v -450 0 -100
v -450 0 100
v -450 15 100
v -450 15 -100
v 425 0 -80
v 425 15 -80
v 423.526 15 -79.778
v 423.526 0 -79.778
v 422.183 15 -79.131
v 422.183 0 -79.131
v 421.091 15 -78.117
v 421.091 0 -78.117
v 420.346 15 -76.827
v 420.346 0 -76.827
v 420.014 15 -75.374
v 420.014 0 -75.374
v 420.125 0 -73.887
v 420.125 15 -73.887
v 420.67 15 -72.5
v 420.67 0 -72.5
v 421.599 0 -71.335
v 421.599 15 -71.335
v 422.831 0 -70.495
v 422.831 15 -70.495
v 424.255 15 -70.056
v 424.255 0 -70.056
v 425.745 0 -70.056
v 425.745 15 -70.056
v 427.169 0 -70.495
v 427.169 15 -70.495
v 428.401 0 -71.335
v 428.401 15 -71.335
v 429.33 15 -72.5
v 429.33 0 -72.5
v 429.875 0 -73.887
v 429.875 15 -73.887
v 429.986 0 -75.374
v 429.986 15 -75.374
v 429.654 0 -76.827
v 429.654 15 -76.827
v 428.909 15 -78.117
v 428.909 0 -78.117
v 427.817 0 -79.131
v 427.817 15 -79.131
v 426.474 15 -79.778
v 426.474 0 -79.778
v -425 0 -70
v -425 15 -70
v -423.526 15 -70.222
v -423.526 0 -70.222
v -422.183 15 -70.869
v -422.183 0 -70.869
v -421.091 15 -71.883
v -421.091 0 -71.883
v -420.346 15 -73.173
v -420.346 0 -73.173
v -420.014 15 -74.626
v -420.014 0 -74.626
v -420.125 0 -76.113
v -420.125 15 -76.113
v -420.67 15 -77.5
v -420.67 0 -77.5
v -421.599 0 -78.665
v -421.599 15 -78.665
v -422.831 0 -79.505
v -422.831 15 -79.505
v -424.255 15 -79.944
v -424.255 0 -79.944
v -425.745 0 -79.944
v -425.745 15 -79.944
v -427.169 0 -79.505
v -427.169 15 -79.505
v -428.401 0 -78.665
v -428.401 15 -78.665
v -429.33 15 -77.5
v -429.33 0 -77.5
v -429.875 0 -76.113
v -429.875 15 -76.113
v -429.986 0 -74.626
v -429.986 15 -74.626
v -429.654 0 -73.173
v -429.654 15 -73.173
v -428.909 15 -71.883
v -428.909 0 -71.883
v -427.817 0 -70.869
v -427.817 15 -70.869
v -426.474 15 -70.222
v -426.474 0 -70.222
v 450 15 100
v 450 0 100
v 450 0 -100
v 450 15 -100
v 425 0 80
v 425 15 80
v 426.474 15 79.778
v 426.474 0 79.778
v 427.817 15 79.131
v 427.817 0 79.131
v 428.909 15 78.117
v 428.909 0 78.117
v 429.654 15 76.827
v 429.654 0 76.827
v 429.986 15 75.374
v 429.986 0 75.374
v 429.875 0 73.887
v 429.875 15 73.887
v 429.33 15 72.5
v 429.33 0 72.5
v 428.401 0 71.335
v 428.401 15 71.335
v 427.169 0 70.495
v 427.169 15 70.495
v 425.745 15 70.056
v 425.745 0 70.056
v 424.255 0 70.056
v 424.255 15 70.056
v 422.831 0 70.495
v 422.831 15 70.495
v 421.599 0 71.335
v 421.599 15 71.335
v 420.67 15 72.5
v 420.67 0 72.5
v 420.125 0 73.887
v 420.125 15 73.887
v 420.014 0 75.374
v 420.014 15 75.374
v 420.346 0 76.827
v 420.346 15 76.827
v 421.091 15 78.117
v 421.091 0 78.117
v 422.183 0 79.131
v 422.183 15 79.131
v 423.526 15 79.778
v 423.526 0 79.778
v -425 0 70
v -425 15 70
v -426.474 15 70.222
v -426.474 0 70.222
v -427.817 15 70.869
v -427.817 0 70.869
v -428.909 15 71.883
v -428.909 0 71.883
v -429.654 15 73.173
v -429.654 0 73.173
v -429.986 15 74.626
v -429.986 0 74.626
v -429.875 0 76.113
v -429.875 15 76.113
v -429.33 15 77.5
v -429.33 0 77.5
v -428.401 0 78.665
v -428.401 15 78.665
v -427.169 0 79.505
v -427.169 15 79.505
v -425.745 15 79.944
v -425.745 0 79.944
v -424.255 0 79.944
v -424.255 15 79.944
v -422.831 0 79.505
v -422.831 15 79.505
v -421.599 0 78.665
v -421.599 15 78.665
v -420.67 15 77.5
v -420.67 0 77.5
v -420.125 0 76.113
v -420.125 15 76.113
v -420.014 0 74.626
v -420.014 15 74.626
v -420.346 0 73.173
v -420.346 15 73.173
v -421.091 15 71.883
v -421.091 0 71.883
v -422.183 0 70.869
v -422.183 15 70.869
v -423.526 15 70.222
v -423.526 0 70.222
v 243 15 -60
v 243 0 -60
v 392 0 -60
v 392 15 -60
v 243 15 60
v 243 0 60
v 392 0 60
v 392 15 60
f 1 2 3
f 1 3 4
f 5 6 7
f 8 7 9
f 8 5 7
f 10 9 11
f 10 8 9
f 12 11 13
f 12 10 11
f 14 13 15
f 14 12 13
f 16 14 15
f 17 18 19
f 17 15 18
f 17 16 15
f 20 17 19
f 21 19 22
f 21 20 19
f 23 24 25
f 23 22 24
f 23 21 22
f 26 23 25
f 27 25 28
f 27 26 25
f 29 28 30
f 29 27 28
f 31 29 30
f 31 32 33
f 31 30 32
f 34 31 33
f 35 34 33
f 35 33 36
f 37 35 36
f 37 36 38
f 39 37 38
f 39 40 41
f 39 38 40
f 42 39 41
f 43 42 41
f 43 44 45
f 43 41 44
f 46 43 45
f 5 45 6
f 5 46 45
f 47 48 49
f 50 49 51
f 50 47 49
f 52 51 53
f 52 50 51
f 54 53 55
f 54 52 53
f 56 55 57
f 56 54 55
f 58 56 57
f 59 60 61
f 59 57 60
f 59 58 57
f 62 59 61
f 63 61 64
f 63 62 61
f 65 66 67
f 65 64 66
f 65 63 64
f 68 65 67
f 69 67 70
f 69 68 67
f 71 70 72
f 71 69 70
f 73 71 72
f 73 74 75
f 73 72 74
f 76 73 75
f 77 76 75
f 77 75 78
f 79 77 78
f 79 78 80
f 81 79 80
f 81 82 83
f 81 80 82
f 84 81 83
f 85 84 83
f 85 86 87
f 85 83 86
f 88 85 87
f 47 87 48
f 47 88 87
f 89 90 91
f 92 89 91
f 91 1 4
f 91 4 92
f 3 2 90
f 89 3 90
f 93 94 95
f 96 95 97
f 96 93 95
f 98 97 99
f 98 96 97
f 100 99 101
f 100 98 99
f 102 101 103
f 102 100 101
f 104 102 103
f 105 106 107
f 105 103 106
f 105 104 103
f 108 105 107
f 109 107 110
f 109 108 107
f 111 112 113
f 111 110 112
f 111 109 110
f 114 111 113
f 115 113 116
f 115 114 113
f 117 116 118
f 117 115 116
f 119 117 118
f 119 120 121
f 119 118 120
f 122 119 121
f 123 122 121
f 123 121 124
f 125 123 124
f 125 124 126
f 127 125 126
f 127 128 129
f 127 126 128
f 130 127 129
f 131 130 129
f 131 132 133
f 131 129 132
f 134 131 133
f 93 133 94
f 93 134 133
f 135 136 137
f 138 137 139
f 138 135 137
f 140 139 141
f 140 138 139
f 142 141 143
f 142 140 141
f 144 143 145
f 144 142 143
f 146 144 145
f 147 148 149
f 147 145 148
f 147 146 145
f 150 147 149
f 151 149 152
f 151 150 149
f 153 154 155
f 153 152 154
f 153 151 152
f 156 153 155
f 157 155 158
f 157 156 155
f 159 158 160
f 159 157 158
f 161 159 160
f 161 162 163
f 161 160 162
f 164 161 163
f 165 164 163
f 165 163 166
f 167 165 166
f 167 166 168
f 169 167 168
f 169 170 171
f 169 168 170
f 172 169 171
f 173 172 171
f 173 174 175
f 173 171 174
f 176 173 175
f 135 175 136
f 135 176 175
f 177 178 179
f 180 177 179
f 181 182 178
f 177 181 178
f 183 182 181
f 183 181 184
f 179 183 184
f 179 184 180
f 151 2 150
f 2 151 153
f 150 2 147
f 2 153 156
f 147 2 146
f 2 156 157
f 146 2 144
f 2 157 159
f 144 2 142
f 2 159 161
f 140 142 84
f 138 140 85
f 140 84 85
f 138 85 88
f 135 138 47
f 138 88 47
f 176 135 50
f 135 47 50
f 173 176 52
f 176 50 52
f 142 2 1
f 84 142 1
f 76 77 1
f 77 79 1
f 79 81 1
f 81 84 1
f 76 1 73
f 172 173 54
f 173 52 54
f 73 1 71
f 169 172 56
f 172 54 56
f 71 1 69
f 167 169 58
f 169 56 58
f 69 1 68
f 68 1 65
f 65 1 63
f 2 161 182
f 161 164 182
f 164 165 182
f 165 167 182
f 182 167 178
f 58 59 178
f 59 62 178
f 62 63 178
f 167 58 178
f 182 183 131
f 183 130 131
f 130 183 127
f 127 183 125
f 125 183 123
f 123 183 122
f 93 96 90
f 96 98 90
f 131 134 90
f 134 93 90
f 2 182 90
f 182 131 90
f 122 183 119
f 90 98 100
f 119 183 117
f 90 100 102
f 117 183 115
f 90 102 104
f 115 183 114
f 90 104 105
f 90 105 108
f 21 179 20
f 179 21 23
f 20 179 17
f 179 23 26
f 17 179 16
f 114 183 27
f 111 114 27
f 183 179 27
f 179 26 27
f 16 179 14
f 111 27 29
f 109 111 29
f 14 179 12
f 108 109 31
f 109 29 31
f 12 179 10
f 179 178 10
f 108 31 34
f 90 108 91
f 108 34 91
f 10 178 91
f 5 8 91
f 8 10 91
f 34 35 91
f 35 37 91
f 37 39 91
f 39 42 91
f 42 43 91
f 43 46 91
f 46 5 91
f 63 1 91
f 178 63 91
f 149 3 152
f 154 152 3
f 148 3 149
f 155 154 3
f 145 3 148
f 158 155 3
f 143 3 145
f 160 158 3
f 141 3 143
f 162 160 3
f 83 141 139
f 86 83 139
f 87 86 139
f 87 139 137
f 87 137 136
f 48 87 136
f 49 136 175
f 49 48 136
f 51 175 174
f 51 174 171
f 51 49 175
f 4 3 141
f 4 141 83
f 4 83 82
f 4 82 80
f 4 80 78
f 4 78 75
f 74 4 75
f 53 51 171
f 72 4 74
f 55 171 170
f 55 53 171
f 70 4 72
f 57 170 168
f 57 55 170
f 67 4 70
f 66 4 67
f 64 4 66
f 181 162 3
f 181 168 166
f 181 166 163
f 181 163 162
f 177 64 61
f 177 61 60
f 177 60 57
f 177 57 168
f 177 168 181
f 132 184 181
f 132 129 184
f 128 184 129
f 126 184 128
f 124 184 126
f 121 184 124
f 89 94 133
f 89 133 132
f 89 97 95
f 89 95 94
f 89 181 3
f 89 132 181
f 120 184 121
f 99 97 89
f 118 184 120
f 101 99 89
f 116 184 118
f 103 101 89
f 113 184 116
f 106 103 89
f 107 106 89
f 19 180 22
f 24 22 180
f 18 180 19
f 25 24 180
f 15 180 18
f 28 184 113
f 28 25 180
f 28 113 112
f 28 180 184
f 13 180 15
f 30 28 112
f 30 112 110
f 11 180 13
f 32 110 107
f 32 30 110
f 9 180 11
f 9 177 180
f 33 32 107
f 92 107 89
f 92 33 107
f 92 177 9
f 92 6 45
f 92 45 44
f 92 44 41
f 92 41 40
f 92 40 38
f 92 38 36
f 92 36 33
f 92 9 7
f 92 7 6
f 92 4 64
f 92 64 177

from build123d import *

# Parameters (mm, degrees)
SKETCH1_W           = 900
SKETCH1_H           = 200
SKETCH1_W_2         = 149
SKETCH1_H_2         = 120
BOSS_EXTRUDE1_DEPTH = 15
SKETCH2_R           = 5
CUT_EXTRUDE1_DEPTH  = 462.221205063


with BuildPart() as part:
    # Sketch1 → Boss-Extrude1 (new body)
    with BuildSketch(Plane(origin=(0, 0, 0), x_dir=(1, 0, 0), z_dir=(0, 1, 0))):
        Rectangle(SKETCH1_W, SKETCH1_H)
        with Locations((317.5, 0)):
            Rectangle(SKETCH1_W_2, SKETCH1_H_2, mode=Mode.SUBTRACT)
    extrude(amount=BOSS_EXTRUDE1_DEPTH)

    # Sketch2 → Cut-Extrude1 (cut, through all)
    with BuildSketch(Plane(origin=(0, 0, 0), x_dir=(1, 0, 0), z_dir=(0, 1, 0))):
        with Locations(Location((-425, 75, 0), (0, 0, 270))):
            Circle(SKETCH2_R)
        with Locations(Location((-425, -75, 0), (0, 0, 90))):
            Circle(SKETCH2_R)
        with Locations(Location((425, 75, 0), (0, 0, 90))):
            Circle(SKETCH2_R)
        with Locations(Location((425, -75, 0), (0, 0, 270))):
            Circle(SKETCH2_R)
    extrude(amount=CUT_EXTRUDE1_DEPTH, mode=Mode.SUBTRACT)


solid = part.part
